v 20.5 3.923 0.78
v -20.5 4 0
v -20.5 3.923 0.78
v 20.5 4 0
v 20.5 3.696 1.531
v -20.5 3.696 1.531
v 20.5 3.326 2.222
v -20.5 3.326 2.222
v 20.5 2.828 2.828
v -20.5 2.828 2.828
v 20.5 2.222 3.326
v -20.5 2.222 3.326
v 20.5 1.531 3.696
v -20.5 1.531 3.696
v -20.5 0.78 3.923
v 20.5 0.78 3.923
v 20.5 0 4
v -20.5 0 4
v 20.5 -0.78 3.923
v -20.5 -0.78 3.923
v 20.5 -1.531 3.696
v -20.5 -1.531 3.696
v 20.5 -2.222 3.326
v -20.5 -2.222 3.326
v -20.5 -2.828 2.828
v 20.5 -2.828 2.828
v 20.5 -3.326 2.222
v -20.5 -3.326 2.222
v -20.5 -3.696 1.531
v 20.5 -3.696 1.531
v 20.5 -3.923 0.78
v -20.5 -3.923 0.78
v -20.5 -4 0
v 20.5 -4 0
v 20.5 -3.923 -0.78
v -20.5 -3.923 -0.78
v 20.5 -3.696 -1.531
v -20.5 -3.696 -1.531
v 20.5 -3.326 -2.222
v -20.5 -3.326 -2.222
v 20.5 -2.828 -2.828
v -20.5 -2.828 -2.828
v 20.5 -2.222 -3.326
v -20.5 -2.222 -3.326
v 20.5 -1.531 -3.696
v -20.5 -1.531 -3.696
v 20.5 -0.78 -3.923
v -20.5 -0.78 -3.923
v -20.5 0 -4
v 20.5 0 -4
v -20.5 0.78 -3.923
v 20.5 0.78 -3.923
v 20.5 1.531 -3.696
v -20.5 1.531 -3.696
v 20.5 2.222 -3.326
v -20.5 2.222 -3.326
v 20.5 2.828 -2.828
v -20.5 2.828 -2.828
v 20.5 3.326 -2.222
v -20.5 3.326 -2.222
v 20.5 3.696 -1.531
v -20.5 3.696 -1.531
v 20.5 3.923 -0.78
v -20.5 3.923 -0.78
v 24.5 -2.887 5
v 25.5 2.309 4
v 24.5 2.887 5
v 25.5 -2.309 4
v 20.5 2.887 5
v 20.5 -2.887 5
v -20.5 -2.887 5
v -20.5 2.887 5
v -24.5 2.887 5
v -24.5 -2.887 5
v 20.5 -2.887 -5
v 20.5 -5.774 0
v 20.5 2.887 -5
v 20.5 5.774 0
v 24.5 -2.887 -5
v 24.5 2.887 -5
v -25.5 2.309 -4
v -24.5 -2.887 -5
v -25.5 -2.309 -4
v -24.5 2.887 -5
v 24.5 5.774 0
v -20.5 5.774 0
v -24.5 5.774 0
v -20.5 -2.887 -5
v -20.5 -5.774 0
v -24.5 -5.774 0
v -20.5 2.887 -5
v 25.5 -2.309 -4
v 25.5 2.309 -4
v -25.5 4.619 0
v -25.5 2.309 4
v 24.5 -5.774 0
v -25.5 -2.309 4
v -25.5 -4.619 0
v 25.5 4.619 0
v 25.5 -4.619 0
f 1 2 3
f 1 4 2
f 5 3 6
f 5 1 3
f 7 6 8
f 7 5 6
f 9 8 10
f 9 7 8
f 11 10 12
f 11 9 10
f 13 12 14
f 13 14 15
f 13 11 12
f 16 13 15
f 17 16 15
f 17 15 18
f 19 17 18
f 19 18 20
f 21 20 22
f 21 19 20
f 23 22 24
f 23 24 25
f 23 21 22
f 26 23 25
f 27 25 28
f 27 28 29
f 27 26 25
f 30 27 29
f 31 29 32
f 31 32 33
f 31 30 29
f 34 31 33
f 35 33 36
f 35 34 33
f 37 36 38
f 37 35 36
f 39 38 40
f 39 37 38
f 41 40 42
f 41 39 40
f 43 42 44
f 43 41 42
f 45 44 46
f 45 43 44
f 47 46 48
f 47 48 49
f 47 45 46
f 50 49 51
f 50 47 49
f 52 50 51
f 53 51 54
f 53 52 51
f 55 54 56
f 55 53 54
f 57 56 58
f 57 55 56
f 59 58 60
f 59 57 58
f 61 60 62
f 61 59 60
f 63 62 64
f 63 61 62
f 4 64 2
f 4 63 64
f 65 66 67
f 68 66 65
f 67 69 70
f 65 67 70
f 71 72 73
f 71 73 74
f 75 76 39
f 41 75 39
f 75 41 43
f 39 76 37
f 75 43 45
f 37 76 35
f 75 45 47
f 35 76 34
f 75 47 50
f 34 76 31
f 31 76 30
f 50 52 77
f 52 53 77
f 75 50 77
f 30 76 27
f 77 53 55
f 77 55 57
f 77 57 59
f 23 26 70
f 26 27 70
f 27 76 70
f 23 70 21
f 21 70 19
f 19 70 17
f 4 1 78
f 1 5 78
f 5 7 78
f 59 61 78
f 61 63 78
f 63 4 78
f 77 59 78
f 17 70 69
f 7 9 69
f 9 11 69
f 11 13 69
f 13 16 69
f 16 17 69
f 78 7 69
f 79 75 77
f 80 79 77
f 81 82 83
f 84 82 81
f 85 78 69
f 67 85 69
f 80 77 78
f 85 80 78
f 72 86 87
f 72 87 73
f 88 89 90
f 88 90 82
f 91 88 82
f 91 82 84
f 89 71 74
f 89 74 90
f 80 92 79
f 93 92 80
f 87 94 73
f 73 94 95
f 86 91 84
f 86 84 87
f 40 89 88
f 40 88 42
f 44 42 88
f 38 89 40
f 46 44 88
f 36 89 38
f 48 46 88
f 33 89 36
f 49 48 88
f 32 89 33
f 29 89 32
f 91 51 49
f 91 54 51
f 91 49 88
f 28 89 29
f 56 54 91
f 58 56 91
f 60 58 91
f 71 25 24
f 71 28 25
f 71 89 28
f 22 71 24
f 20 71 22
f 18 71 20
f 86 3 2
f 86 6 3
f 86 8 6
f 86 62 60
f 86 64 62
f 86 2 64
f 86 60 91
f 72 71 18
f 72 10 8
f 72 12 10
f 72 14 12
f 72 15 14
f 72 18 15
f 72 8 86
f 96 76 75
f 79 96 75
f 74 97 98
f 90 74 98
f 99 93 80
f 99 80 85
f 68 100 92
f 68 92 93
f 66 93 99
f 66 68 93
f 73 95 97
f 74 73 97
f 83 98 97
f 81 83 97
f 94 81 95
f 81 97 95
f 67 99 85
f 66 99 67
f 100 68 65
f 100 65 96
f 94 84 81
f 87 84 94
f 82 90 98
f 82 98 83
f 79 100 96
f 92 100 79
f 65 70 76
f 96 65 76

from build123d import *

# Parameters (mm, degrees)
F0_R     = 4
F1_DEPTH = 20.5
F3_DEPTH = 5
F4_SIZE  = 1


# Not quite as in the source:
# - a pattern or mirror of a feature is missing from the dataset's text; its kind, count and spacing are read off the source's solid


with BuildPart() as f1:
    # F0 (on Right) → F1 (new body, symmetric)
    with BuildSketch(Plane.YZ):
        Circle(F0_R)
    extrude(amount=F1_DEPTH, both=True)

    # F2 (on face) → F3 (join)
    with BuildSketch(Plane.YZ.offset(20.5)):
        Polygon((2.8867513459, 5), (-2.8867513459, 5), (-5.7735026919, 0), (-2.8867513459, -5), (2.8867513459, -5), (5.7735026919, 0), align=None)
    f3 = extrude(amount=F3_DEPTH)

    # F3_copies: F3 across plane
    add(f3.mirror(Plane(origin=(0, 0, 0), x_dir=(0, 0, -1), z_dir=(-1, 0, 0))))

    # F4
    f4_edges = [f1.edges().sort_by_distance(p)[0] for p in [
        (25.5, 4.330127, 2.5),
        (25.5, 0, 5),
        (25.5, -4.330127, 2.5),
        (25.5, -4.330127, -2.5),
        (25.5, 0, -5),
        (25.5, 4.330127, -2.5),
        (-25.5, 4.330127, 2.5),
        (-25.5, 4.330127, -2.5),
        (-25.5, 0, 5),
        (-25.5, -4.330127, 2.5),
        (-25.5, -4.330127, -2.5),
        (-25.5, 0, -5),
    ]]
    chamfer(f4_edges, length=F4_SIZE)


solid = f1.part
